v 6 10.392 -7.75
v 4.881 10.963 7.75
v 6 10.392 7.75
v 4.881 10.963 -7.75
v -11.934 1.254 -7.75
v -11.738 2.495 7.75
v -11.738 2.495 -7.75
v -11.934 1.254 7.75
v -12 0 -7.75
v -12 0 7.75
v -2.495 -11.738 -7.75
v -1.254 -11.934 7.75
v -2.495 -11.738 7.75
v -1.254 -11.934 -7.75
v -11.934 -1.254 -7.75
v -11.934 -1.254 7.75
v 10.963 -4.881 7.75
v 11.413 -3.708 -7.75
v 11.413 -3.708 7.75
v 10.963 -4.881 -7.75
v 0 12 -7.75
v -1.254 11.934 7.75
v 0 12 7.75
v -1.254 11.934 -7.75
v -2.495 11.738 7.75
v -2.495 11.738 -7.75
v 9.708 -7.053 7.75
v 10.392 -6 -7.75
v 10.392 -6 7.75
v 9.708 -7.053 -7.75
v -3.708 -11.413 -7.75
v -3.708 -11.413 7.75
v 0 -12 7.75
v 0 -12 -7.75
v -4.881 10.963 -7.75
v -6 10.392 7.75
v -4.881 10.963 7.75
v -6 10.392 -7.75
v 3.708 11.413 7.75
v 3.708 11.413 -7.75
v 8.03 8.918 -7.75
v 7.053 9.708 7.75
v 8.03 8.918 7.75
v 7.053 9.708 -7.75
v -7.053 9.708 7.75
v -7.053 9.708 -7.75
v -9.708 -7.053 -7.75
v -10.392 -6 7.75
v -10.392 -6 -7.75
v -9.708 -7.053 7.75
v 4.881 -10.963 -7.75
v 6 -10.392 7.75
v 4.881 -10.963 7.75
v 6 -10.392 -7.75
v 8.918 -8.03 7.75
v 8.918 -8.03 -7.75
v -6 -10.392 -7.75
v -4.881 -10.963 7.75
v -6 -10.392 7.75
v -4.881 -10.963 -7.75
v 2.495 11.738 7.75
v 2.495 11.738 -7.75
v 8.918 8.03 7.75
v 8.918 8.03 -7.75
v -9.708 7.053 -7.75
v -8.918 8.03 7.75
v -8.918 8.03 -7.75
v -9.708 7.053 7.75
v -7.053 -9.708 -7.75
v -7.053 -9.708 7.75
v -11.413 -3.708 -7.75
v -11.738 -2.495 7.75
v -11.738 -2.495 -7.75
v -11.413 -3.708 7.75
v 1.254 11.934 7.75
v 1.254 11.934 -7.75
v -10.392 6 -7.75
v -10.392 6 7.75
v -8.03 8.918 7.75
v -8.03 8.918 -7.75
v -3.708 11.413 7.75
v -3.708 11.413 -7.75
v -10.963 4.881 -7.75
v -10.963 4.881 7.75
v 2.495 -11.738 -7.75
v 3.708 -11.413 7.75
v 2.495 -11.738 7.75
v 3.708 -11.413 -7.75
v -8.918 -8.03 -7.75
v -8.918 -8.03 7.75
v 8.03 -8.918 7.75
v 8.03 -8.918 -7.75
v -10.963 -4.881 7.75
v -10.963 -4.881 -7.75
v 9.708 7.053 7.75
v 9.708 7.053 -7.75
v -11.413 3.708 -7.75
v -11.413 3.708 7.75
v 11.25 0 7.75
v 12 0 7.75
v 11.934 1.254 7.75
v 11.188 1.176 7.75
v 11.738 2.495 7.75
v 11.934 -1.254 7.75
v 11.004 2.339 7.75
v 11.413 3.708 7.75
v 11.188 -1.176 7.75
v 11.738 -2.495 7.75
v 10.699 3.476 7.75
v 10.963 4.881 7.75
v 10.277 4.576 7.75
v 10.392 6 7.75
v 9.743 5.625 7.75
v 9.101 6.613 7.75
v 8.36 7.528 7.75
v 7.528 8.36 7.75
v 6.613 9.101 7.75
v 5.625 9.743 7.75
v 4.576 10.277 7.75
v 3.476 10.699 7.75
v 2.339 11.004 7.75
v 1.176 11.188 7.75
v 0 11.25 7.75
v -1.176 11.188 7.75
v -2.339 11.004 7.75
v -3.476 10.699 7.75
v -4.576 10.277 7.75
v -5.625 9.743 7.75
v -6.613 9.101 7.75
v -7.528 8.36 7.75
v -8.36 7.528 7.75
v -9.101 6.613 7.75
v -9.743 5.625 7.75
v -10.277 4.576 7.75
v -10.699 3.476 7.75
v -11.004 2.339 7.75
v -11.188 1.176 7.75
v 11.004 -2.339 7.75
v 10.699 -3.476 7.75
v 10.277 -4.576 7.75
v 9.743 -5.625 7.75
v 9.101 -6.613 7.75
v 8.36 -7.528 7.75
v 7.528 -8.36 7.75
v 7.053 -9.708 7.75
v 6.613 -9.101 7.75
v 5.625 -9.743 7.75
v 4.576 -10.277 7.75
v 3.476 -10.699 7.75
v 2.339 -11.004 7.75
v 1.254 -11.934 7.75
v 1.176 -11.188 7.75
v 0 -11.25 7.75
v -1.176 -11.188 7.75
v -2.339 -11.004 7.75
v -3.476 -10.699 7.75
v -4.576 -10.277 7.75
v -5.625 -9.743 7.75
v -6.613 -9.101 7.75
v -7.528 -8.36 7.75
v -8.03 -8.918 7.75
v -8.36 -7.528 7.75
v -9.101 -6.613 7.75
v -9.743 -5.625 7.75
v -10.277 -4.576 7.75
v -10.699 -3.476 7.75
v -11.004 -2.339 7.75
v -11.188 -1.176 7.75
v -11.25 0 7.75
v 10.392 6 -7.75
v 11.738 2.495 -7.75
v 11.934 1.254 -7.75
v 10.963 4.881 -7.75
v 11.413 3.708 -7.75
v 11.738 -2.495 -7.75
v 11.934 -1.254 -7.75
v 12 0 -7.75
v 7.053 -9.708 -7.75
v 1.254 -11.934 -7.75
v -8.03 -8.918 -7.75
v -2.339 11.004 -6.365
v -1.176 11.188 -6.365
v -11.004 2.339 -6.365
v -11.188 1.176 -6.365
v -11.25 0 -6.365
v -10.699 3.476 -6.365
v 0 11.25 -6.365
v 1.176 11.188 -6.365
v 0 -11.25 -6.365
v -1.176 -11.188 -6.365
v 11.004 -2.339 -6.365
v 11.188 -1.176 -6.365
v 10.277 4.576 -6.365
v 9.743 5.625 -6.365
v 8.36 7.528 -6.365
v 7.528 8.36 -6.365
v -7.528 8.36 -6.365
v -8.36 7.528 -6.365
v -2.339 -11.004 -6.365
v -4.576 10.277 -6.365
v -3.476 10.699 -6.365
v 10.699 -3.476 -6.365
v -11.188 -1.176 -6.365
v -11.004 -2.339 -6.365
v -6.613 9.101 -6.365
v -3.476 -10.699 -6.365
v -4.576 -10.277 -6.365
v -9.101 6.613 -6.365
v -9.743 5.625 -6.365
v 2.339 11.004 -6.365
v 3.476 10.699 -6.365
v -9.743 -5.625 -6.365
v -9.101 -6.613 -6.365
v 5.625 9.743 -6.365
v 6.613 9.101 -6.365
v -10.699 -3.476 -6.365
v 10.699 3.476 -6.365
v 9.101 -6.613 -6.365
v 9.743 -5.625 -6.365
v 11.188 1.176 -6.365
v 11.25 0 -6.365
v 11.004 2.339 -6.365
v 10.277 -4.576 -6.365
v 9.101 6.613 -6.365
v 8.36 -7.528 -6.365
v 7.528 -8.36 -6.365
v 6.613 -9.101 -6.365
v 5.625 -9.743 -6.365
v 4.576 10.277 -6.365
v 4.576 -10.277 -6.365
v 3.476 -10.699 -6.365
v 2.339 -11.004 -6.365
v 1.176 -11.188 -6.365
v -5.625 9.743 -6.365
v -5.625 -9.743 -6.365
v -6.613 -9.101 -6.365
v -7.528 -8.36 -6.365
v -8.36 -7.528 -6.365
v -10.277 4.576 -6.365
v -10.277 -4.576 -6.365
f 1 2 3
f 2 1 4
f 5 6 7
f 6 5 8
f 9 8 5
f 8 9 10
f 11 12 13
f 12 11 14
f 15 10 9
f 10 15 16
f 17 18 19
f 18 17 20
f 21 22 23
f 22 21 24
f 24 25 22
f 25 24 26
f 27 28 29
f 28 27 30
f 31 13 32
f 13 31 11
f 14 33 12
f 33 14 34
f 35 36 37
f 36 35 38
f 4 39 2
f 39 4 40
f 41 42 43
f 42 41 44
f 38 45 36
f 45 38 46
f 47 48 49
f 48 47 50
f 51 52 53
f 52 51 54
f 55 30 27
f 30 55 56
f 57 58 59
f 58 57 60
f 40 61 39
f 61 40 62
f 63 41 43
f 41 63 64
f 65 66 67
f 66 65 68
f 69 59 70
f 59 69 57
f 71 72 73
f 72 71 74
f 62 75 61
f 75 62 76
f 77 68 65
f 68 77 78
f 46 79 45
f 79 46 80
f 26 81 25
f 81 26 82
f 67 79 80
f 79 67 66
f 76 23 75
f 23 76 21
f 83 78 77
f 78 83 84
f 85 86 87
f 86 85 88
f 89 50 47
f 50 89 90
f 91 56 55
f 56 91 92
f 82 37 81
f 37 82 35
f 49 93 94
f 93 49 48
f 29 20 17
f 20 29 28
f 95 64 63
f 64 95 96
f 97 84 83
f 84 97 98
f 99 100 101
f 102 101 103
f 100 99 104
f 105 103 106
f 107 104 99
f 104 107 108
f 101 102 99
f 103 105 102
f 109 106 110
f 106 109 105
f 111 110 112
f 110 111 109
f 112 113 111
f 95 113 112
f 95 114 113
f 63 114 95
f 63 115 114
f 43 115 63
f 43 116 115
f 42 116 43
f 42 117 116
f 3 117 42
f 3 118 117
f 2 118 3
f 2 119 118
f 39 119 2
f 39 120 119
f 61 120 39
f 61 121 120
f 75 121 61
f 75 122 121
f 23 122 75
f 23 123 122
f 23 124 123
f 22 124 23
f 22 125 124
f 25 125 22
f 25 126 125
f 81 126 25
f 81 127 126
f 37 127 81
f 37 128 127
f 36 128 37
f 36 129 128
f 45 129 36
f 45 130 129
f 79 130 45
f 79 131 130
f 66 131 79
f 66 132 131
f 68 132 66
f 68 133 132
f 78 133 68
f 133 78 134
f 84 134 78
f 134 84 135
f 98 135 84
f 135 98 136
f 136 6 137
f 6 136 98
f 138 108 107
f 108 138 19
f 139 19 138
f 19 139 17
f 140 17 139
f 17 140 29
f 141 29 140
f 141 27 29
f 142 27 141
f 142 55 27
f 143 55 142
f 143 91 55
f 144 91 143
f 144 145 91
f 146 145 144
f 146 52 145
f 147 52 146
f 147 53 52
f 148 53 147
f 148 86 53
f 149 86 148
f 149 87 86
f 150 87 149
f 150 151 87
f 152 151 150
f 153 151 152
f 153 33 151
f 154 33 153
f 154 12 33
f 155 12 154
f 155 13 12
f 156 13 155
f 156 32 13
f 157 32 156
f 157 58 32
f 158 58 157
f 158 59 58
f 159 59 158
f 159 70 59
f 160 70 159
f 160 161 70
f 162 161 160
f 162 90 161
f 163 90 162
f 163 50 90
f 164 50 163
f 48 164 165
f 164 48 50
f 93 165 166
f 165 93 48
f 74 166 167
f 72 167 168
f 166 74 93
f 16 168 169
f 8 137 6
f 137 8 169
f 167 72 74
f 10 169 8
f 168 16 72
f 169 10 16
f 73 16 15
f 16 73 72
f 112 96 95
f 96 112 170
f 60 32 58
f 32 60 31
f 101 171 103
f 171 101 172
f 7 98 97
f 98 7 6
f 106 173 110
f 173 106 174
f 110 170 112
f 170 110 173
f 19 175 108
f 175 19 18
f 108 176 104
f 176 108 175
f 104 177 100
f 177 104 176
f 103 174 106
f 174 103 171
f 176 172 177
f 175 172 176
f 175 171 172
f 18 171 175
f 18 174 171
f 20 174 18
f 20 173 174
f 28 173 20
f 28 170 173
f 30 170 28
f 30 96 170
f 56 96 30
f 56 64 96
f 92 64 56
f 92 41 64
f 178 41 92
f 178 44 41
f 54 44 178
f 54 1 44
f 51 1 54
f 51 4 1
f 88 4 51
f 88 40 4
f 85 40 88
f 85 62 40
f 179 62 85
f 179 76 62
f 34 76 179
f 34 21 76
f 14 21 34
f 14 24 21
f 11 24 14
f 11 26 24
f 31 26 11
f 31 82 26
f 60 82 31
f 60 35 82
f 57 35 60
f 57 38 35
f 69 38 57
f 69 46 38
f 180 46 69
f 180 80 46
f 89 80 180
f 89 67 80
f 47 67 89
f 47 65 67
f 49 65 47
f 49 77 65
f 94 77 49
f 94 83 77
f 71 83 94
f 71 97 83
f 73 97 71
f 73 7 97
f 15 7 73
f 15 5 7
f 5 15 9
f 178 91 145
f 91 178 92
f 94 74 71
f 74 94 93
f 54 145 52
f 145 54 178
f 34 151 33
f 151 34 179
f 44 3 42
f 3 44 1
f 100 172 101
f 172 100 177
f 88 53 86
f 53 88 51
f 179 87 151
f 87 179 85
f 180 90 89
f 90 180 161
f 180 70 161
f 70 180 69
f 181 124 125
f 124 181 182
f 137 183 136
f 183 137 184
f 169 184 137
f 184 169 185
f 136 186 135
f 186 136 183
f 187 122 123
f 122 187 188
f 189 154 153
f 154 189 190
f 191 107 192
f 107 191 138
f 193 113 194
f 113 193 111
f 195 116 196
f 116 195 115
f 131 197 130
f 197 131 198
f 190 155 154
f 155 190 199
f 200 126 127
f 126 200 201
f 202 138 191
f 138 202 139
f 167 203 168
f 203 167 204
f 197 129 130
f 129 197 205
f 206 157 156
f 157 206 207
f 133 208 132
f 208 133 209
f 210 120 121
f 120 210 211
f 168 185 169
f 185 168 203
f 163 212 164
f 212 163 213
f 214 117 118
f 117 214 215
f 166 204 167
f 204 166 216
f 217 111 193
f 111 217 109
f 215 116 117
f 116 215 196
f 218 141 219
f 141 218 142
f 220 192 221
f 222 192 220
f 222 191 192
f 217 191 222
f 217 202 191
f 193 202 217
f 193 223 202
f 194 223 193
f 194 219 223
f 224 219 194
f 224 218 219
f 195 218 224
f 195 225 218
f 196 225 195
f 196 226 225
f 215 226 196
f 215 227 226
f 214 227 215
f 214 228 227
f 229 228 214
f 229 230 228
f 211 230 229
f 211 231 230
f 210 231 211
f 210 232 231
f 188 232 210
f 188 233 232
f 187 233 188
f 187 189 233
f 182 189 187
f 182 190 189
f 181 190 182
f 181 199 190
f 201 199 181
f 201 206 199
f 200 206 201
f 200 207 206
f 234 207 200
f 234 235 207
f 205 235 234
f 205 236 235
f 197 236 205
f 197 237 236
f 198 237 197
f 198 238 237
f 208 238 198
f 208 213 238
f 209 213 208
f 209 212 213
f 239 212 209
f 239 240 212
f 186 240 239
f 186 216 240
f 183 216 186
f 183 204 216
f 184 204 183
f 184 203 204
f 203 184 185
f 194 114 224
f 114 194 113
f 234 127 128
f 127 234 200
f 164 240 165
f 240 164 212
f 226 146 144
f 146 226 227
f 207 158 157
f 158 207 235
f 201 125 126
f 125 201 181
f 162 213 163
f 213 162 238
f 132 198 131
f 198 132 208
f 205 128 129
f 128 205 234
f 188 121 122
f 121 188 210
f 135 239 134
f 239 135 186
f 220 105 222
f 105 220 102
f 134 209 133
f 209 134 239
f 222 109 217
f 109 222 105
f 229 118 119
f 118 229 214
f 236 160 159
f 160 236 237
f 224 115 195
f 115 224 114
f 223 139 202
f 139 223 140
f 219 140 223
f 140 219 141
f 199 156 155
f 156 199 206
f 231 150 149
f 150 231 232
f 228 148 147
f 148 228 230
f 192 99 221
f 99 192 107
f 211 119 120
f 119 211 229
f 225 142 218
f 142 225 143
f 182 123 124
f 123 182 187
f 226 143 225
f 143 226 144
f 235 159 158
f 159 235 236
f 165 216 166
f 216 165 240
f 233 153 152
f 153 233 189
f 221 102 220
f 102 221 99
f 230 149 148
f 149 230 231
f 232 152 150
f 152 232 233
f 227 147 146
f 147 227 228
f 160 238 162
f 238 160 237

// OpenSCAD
// file: variables.scad
mm_x = [61.5, 21.5, 6, 45.5, 18, 39];
mm_y = [-18, 21, -27.5, -27.5, 7, 39];
mm_r = [110, -15, 0, 0, 0, -70];
mm_l = [13, 9, 0, 0, 0, 8];

xArray = [-3, 57,  55,  -26]; //NO MIDDLE PIN
yArray = [38, 31, -56,  -33]; //NO MIDDLE PIN

outerD = 9;
innerD = 4.5;
height = 17;

panel_2_x = 110;
panel_2_y = 110;

one_to_one_x = 54.5;
one_to_one_y = 12;

bolt_inner = 2.55;

screw_distance = 31;
// file: plunger.scad
include <./modules.scad>
include <./variables.scad>

module plunger () {
        $fn = 60;
        FINGER = 39;
        CYL_D = 9;
        WALL = 3;
    difference () {
        union () {
            cylinder(r1 = CYL_D, r2 = CYL_D - 1, h = 30, center = true); //outer cylinder
            difference () {
                translate([0, 0, -9]) rotate([90, 0, 0]) rounded_cube([50, 12, 10], d = 5, center = true);
                translate([23, 0, 9]) rotate([90, 0, 0]) cylinder(r = FINGER/2, h = 20, center = true);
                translate([-23, 0, 9]) rotate([90, 0, 0]) cylinder(r = FINGER/2, h = 20, center = true);
            }
        }
        translate([0, 0, 2]) cylinder( r = CYL_D - WALL,  h = 30, center = true); //inner cylinder
        cylinder(r = 7/2, h = 50, center = true); // button hole
        
    }
    
    //cylinder(r= 5, h = 50, center = true); button
}

module plunger_top () {
    $fn = 60;
    CYL_D = 9;
    WALL = 3;
    
    difference () {
        union () {
            cylinder(r = CYL_D - WALL - 0.015, h =6, center = true);
            translate([0, 0, 2]) cylinder (r = CYL_D - 1, h = 2, center = true);
        }
        translate([0, 0, -2]) cylinder(r = CYL_D - WALL - 0.015 - 1, h =6, center = true);
        //cylinder(r = 3/2, h = 50, center = true); // wire
        cylinder(r = 3.9/2, h = 50, center = true); //3.5mm wire
    }
}

module plunger_plate () {
    translate([40, 0, -12]) rotate([180, 0, 0]) plunger_top();
    plunger();
        
    //decoys
    /*translate([44,20,-13]) cube([4, 4, 4], center = true);
    translate([44,-20,-13]) cube([4, 4, 4], center = true);
    translate([-23,20,-13]) cube([4, 4, 4], center = true);
    translate([-23,-20,-13]) cube([4, 4, 4], center = true);*/
}
// main file
include <./case.scad>
include <./mount.scad>
include <./plunger.scad>
/*

 INTVAL 3 

*/

module stl_plate () {
    //translate([0, 0, -0.5]) cube([150, 150, 1], center = true);
    translate([-60, 10, 7.5]) rotate([0, 180, 0]) intval_laser_standoffs_plate();
    translate([-27, 50, -9.5]) rotate([0, 0, 13]) translate([-40 + 2, -1, 14]) rotate([0, 0, -13]) l289N_mount();
    
    translate([23, 1, -5.75]) rotate([0, 0, 90]) motor_mount_bottom();
    translate([48, -13, 9]) rotate([0, 180, 0]) key_cap();
    translate([-5, -11, 3]) rotate([0, 0, 190]) geared_motor_mount_120();
    translate([65, 44, 26.5]) rotate([0, 180, 0]) motor_key_120();
    translate([15, -42, 15]) plunger_plate();
    translate([-52, -20, 85.5]) rotate([0, 180, -90]) motor_cap_120(false);
};

module dxf_plate () {
    translate([125, 0, 0]) rotate([0, 0, 13]) projection() intval_panel_laser();
    rotate([0, 0, 13]) intval_laser_panel_cover(LASER=true, ALL_RED=true);
};

module exploded_view () {
    intval_panel_laser();
    translate([0, 0, 5]) translate([-40 + 2, -1, 14]) rotate([0, 0, -13]) l289N_mount();
    translate([0, 0, 5]) motor_mount_bottom();
    translate([0, 0, 20]) motor_key_120();
    translate([one_to_one_x, one_to_one_y, 50]) geared_motor_mount_120();
    translate([one_to_one_x, one_to_one_y, 50]) motor_cap_120(false);
    translate([0, 0, 60]) intval_laser_panel_cover(false, ALL_RED=true);
}


//bolex_pin_laser(0, 0);
//intval_laser_standoffs_plate();
//intval_electronics_mount("METRO");
//motor_mount_bottom();
//projection () intval_panel_laser();
//intval_laser_panel_cover(true, ALL_RED=true);
//rotate([0, 0, 13]) intval_panel_laser();
//rotate([0, 0, 13]) intval_laser_panel_cover();
rotate([0, 180, 0]) key_cap();
//geared_motor_mount_120();
//motor_key();
//motor_key_120();
//plunger_plate();
//plunger();
//rotate([0, 180, 0]) plunger_top();
//motor_cap(false);
//rotate([0, 180, 0]) motor_cap_120(false);
//translate([0, 0, 39 / 2 + 5.75]) bolt_guide();

//exploded_view();
//stl_plate();
//dxf_plate();
